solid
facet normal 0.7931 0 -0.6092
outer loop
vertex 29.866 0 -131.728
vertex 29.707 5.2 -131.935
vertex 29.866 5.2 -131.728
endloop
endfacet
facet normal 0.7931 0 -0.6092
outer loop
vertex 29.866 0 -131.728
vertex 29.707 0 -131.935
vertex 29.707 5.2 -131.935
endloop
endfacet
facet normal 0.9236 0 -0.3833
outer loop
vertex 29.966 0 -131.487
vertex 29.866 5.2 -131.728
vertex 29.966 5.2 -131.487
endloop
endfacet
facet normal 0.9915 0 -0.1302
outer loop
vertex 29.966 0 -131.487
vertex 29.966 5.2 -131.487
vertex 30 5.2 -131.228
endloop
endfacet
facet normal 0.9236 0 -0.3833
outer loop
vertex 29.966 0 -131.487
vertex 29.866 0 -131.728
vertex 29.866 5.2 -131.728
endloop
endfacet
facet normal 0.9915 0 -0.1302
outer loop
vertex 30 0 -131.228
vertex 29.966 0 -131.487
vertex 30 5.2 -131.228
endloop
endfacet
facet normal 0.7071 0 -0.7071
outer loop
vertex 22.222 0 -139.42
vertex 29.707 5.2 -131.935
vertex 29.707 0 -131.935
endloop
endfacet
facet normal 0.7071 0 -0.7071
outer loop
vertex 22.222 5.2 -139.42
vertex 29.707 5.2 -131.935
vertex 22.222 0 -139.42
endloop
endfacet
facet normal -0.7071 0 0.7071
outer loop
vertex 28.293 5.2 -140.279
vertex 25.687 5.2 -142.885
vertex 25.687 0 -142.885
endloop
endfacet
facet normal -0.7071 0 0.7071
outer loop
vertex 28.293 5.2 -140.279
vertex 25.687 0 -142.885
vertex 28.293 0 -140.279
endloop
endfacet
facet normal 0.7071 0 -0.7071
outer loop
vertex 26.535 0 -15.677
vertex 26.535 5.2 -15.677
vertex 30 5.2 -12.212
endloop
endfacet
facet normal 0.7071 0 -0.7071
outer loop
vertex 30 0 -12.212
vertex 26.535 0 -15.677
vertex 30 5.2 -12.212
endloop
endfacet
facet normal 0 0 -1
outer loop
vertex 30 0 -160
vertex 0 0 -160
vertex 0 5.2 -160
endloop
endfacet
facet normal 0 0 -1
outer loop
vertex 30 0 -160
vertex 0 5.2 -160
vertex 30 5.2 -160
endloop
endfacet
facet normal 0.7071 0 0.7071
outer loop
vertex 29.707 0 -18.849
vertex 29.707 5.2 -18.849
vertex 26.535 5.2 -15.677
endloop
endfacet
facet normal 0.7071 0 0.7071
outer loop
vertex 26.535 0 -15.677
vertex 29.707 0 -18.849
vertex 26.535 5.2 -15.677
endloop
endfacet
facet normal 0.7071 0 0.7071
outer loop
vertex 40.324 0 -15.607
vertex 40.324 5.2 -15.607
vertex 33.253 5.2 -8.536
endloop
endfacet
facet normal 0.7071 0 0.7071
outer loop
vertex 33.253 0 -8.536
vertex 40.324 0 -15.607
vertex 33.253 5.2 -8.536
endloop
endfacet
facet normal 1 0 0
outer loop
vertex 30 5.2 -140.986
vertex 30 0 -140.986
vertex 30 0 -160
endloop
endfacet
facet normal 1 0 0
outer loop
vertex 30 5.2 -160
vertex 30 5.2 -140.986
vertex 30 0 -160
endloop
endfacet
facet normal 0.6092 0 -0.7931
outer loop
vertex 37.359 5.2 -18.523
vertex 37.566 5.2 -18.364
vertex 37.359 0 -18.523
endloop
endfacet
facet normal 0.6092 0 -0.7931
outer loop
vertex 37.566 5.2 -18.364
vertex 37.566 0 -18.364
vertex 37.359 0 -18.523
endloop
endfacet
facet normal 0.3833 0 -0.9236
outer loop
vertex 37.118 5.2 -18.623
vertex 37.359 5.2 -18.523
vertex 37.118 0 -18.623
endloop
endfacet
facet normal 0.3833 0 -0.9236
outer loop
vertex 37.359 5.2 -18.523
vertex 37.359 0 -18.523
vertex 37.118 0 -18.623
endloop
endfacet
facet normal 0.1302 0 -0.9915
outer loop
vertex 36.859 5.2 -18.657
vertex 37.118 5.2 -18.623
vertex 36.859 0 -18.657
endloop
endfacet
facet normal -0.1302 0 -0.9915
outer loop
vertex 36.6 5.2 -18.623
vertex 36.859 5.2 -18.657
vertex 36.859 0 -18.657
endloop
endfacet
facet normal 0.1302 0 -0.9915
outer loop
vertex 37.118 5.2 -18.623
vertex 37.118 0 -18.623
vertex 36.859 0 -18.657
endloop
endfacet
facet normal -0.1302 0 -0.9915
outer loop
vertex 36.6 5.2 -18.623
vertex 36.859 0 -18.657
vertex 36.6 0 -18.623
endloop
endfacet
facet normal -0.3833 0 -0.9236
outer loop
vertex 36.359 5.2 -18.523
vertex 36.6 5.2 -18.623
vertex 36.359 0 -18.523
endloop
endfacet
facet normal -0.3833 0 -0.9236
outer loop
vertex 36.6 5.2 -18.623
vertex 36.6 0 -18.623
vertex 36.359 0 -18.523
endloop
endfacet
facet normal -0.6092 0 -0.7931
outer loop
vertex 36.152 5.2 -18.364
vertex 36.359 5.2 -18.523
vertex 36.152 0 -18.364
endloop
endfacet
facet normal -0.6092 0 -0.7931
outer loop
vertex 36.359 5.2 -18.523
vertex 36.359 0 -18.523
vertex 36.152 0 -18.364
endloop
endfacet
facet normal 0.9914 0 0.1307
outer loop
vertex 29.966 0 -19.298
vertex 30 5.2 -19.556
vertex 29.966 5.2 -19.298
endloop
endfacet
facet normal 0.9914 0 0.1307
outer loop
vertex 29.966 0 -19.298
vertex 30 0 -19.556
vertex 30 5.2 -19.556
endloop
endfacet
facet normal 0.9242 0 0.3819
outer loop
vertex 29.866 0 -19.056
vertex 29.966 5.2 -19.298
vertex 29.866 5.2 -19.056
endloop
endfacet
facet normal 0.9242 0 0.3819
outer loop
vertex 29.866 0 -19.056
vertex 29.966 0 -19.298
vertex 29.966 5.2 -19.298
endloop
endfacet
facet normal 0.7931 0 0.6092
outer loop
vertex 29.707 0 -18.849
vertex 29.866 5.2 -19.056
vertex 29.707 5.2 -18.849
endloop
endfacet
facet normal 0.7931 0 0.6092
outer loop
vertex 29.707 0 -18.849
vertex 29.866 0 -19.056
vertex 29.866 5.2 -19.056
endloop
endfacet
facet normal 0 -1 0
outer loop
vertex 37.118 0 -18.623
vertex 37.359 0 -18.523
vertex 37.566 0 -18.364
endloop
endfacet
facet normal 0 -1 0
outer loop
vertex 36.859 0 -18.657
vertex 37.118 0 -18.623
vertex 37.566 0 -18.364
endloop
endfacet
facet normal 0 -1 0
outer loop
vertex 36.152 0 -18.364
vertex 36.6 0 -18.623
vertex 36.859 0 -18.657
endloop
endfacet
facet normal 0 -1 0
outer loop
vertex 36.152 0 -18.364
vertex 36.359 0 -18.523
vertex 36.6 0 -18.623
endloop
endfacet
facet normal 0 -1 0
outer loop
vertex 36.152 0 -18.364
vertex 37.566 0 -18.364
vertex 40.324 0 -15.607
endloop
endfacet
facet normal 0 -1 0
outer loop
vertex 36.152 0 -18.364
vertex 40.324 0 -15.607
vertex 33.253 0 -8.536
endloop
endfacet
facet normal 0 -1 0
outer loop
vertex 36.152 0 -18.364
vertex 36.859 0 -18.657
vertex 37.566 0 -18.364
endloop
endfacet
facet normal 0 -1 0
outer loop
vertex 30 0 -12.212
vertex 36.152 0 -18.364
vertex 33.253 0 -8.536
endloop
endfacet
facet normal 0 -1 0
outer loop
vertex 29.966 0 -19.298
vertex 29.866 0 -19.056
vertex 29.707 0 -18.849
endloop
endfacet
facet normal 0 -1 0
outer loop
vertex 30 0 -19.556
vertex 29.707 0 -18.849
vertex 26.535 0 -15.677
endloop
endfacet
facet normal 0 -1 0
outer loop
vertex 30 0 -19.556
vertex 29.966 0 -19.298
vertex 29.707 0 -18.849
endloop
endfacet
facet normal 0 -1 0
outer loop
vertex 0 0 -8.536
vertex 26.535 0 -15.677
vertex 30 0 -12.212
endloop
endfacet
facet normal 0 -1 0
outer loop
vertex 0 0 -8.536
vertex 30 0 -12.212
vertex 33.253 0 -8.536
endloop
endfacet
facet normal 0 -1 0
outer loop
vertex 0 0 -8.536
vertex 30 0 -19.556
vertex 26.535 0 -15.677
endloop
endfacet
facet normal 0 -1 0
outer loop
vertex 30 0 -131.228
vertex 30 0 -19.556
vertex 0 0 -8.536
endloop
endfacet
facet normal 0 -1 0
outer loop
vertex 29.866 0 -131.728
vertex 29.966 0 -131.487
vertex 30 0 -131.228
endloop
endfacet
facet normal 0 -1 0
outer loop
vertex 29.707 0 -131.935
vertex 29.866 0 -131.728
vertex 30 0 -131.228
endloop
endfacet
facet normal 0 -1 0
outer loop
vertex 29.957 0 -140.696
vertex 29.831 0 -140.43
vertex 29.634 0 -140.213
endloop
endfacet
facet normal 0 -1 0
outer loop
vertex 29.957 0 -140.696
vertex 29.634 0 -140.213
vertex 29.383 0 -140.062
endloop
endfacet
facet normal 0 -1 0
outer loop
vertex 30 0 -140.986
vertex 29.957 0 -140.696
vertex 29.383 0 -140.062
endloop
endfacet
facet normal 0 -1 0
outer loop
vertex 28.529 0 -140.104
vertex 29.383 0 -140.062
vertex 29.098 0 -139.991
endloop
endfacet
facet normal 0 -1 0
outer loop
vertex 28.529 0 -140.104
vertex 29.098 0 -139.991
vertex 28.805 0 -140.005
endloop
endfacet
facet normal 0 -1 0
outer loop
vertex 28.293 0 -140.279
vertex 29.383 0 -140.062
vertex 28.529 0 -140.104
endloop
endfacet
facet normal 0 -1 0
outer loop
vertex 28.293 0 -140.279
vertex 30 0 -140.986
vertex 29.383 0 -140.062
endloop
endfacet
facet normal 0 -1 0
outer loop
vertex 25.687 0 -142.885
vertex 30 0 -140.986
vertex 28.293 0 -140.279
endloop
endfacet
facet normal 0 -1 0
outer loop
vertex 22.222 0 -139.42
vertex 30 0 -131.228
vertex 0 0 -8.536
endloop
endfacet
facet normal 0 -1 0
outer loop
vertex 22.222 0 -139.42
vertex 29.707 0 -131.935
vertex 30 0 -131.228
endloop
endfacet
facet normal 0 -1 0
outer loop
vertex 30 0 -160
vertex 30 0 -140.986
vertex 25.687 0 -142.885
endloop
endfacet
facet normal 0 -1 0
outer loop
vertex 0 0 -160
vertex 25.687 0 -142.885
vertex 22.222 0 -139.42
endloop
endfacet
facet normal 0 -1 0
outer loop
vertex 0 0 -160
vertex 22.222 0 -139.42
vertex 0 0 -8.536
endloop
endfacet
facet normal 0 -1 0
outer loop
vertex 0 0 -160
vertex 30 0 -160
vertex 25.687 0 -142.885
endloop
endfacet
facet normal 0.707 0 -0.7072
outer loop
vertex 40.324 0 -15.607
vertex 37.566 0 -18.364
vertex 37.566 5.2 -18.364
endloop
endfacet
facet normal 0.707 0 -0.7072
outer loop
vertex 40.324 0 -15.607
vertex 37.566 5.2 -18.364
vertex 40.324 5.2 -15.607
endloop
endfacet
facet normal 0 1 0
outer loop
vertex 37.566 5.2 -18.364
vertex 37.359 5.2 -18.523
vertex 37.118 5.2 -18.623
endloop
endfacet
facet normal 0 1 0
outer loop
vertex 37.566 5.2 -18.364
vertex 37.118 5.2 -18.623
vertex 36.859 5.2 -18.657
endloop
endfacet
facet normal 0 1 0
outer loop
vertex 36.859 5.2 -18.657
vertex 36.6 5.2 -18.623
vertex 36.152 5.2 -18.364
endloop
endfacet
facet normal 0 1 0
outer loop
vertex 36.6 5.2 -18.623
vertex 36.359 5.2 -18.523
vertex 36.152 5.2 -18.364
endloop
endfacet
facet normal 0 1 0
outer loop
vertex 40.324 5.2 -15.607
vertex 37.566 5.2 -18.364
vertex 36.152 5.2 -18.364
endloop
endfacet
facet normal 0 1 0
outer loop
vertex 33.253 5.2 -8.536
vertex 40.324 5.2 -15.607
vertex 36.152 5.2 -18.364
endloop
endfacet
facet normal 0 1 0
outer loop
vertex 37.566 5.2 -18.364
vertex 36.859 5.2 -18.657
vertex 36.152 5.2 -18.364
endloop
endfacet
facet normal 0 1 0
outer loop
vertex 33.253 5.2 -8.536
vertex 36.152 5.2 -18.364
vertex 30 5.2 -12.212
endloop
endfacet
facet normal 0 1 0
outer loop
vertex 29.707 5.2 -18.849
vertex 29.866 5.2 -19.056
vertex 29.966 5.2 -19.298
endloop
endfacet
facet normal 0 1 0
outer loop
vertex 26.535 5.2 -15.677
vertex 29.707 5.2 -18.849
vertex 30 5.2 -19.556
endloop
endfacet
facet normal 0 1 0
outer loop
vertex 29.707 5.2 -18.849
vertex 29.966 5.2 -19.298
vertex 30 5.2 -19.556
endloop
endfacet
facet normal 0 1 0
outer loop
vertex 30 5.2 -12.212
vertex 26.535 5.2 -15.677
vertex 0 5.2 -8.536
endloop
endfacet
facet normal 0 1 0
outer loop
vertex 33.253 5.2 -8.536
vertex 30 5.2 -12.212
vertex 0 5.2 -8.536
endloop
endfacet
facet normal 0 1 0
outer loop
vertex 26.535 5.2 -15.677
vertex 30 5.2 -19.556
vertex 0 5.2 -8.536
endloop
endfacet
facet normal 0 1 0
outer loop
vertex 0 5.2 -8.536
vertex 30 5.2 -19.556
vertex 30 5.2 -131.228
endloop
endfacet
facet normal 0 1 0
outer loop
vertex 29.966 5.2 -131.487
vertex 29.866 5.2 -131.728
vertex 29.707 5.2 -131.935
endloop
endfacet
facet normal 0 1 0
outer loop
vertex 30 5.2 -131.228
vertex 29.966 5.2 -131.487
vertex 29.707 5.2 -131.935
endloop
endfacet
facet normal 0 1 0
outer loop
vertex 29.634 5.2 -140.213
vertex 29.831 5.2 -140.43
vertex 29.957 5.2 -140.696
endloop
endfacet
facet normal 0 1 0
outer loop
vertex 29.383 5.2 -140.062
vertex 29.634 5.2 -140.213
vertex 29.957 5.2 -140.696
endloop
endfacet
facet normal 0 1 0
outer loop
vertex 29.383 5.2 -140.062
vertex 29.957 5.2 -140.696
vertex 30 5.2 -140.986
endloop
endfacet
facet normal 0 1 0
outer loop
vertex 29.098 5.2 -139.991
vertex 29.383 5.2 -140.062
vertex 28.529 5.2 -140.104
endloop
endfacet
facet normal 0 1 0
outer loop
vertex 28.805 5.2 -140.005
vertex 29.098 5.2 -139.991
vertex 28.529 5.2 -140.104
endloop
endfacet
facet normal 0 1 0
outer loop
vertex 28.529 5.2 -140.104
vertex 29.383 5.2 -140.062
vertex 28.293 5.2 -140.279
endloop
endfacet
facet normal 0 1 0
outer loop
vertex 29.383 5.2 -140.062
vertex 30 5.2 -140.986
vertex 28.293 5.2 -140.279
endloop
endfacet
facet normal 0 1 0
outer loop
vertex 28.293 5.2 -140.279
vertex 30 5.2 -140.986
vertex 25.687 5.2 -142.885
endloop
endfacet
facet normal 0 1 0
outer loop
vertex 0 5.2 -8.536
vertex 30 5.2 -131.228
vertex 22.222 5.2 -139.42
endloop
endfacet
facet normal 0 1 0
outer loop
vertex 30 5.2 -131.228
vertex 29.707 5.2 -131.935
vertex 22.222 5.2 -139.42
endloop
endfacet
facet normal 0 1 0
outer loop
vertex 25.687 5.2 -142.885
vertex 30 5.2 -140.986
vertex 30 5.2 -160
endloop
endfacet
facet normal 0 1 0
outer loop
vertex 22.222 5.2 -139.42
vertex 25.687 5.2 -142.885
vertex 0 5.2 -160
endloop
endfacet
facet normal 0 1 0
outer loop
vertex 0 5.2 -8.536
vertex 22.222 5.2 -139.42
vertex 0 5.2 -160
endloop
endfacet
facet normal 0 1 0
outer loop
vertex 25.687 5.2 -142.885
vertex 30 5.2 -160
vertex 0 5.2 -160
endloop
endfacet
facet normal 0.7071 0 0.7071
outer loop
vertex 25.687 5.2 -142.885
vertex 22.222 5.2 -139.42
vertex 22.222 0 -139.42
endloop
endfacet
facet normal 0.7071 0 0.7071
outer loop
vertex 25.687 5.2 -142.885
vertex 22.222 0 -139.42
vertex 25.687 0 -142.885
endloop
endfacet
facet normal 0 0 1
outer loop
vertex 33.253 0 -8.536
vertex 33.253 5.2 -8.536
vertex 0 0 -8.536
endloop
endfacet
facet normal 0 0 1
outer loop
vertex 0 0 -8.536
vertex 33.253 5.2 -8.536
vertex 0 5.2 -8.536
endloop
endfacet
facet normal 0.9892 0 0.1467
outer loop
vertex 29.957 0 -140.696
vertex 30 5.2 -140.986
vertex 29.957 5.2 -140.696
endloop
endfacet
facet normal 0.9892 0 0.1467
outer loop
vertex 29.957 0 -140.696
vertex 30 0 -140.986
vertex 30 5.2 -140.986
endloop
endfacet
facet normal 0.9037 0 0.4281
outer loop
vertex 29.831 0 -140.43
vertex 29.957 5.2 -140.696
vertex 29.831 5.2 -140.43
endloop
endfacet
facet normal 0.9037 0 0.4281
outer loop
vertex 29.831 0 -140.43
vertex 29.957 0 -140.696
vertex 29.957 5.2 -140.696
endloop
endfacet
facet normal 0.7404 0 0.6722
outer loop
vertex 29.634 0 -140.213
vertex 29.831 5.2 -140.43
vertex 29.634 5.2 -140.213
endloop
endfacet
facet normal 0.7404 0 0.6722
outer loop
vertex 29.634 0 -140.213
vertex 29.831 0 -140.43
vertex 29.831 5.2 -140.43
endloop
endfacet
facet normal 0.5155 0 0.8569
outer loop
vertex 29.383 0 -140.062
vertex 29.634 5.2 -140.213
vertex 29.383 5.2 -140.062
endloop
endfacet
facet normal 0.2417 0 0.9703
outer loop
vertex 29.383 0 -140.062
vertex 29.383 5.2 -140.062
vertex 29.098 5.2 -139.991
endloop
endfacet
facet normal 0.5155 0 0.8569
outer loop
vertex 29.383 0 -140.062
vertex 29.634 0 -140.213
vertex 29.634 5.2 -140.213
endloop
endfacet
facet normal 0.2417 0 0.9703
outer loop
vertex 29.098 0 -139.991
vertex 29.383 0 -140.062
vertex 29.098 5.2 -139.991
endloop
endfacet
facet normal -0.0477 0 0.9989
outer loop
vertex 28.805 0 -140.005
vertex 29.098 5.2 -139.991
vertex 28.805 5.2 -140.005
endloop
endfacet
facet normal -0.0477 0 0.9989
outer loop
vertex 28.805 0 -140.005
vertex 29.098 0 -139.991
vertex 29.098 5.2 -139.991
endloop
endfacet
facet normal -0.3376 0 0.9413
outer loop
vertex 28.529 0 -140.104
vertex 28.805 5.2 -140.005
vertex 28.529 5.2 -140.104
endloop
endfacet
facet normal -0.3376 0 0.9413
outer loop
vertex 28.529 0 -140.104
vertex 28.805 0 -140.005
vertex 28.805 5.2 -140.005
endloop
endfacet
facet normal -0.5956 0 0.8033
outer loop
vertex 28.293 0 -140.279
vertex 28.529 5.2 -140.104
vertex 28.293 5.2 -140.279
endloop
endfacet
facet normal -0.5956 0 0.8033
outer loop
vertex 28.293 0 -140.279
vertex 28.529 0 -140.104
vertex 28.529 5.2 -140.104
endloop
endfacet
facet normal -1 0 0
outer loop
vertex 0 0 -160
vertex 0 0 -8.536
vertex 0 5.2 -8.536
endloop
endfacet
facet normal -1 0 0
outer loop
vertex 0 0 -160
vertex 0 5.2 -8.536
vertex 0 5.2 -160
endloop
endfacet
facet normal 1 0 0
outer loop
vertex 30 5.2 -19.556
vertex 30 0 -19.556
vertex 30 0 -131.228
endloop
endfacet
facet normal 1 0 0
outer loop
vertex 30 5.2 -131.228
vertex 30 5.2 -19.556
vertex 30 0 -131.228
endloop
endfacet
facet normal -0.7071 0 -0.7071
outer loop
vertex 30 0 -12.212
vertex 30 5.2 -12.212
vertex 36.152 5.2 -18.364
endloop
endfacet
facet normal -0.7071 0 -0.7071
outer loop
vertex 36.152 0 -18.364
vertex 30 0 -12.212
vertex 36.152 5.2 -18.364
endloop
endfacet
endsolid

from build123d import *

# Parameters (mm, degrees)
SKETCH1_W           = 30
SKETCH1_H           = 160
BOSS_EXTRUDE1_DEPTH = 5.2
CUT_EXTRUDE1_DEPTH  = 10
FILLET1_R           = 1
BOSS_EXTRUDE2_DEPTH = 5.2
FILLET2_R           = 1


with BuildPart() as part:
    # Sketch1 → Boss-Extrude1 (new body)
    with BuildSketch(Plane(origin=(0, 0, 0), x_dir=(1, 0, 0), z_dir=(0, 1, 0))):
        with Locations((15, 80)):
            Rectangle(SKETCH1_W, SKETCH1_H)
    extrude(amount=BOSS_EXTRUDE1_DEPTH)

    # Sketch2 → Cut-Extrude1 (cut)
    with BuildSketch(Plane(origin=(0, 5.2, 0), x_dir=(1, 0, 0), z_dir=(0, 1, 0))):
        Polygon((30, 131.642135624), (22.221825407, 139.420310217), (25.686648635, 142.885133445), (30, 138.571782079), align=None)
        Polygon((30, 19.142135624), (19.393398282, 8.535533906), (0, 8.535533906), (0, 0), (30, 0), align=None)
    extrude(amount=-CUT_EXTRUDE1_DEPTH, mode=Mode.SUBTRACT)

    # Fillet1
    fillet1_edges = [part.edges().sort_by_distance(p)[0] for p in [
        (30, 2.6, -138.571782079),
        (30, 2.6, -131.642135624),
    ]]
    fillet(fillet1_edges, radius=FILLET1_R)

    # Sketch3 → Boss-Extrude2 (add)
    with BuildSketch(Plane(origin=(0, 5.2, 0), x_dir=(1, 0, 0), z_dir=(0, 1, 0))):
        Polygon((26.535176772, 15.677312396), (30, 12.212489168), (36.858935778, 19.071424946), (40.323759005, 15.606601718), (33.252691193, 8.535533906), (19.393398282, 8.535533906), align=None)
    extrude(amount=-BOSS_EXTRUDE2_DEPTH)

    # Fillet2
    fillet2_edges = [part.edges().sort_by_distance(p)[0] for p in [
        (30, 2.6, -19.142135624),
        (36.858935778, 2.6, -19.071424946),
    ]]
    fillet(fillet2_edges, radius=FILLET2_R)


solid = part.part
